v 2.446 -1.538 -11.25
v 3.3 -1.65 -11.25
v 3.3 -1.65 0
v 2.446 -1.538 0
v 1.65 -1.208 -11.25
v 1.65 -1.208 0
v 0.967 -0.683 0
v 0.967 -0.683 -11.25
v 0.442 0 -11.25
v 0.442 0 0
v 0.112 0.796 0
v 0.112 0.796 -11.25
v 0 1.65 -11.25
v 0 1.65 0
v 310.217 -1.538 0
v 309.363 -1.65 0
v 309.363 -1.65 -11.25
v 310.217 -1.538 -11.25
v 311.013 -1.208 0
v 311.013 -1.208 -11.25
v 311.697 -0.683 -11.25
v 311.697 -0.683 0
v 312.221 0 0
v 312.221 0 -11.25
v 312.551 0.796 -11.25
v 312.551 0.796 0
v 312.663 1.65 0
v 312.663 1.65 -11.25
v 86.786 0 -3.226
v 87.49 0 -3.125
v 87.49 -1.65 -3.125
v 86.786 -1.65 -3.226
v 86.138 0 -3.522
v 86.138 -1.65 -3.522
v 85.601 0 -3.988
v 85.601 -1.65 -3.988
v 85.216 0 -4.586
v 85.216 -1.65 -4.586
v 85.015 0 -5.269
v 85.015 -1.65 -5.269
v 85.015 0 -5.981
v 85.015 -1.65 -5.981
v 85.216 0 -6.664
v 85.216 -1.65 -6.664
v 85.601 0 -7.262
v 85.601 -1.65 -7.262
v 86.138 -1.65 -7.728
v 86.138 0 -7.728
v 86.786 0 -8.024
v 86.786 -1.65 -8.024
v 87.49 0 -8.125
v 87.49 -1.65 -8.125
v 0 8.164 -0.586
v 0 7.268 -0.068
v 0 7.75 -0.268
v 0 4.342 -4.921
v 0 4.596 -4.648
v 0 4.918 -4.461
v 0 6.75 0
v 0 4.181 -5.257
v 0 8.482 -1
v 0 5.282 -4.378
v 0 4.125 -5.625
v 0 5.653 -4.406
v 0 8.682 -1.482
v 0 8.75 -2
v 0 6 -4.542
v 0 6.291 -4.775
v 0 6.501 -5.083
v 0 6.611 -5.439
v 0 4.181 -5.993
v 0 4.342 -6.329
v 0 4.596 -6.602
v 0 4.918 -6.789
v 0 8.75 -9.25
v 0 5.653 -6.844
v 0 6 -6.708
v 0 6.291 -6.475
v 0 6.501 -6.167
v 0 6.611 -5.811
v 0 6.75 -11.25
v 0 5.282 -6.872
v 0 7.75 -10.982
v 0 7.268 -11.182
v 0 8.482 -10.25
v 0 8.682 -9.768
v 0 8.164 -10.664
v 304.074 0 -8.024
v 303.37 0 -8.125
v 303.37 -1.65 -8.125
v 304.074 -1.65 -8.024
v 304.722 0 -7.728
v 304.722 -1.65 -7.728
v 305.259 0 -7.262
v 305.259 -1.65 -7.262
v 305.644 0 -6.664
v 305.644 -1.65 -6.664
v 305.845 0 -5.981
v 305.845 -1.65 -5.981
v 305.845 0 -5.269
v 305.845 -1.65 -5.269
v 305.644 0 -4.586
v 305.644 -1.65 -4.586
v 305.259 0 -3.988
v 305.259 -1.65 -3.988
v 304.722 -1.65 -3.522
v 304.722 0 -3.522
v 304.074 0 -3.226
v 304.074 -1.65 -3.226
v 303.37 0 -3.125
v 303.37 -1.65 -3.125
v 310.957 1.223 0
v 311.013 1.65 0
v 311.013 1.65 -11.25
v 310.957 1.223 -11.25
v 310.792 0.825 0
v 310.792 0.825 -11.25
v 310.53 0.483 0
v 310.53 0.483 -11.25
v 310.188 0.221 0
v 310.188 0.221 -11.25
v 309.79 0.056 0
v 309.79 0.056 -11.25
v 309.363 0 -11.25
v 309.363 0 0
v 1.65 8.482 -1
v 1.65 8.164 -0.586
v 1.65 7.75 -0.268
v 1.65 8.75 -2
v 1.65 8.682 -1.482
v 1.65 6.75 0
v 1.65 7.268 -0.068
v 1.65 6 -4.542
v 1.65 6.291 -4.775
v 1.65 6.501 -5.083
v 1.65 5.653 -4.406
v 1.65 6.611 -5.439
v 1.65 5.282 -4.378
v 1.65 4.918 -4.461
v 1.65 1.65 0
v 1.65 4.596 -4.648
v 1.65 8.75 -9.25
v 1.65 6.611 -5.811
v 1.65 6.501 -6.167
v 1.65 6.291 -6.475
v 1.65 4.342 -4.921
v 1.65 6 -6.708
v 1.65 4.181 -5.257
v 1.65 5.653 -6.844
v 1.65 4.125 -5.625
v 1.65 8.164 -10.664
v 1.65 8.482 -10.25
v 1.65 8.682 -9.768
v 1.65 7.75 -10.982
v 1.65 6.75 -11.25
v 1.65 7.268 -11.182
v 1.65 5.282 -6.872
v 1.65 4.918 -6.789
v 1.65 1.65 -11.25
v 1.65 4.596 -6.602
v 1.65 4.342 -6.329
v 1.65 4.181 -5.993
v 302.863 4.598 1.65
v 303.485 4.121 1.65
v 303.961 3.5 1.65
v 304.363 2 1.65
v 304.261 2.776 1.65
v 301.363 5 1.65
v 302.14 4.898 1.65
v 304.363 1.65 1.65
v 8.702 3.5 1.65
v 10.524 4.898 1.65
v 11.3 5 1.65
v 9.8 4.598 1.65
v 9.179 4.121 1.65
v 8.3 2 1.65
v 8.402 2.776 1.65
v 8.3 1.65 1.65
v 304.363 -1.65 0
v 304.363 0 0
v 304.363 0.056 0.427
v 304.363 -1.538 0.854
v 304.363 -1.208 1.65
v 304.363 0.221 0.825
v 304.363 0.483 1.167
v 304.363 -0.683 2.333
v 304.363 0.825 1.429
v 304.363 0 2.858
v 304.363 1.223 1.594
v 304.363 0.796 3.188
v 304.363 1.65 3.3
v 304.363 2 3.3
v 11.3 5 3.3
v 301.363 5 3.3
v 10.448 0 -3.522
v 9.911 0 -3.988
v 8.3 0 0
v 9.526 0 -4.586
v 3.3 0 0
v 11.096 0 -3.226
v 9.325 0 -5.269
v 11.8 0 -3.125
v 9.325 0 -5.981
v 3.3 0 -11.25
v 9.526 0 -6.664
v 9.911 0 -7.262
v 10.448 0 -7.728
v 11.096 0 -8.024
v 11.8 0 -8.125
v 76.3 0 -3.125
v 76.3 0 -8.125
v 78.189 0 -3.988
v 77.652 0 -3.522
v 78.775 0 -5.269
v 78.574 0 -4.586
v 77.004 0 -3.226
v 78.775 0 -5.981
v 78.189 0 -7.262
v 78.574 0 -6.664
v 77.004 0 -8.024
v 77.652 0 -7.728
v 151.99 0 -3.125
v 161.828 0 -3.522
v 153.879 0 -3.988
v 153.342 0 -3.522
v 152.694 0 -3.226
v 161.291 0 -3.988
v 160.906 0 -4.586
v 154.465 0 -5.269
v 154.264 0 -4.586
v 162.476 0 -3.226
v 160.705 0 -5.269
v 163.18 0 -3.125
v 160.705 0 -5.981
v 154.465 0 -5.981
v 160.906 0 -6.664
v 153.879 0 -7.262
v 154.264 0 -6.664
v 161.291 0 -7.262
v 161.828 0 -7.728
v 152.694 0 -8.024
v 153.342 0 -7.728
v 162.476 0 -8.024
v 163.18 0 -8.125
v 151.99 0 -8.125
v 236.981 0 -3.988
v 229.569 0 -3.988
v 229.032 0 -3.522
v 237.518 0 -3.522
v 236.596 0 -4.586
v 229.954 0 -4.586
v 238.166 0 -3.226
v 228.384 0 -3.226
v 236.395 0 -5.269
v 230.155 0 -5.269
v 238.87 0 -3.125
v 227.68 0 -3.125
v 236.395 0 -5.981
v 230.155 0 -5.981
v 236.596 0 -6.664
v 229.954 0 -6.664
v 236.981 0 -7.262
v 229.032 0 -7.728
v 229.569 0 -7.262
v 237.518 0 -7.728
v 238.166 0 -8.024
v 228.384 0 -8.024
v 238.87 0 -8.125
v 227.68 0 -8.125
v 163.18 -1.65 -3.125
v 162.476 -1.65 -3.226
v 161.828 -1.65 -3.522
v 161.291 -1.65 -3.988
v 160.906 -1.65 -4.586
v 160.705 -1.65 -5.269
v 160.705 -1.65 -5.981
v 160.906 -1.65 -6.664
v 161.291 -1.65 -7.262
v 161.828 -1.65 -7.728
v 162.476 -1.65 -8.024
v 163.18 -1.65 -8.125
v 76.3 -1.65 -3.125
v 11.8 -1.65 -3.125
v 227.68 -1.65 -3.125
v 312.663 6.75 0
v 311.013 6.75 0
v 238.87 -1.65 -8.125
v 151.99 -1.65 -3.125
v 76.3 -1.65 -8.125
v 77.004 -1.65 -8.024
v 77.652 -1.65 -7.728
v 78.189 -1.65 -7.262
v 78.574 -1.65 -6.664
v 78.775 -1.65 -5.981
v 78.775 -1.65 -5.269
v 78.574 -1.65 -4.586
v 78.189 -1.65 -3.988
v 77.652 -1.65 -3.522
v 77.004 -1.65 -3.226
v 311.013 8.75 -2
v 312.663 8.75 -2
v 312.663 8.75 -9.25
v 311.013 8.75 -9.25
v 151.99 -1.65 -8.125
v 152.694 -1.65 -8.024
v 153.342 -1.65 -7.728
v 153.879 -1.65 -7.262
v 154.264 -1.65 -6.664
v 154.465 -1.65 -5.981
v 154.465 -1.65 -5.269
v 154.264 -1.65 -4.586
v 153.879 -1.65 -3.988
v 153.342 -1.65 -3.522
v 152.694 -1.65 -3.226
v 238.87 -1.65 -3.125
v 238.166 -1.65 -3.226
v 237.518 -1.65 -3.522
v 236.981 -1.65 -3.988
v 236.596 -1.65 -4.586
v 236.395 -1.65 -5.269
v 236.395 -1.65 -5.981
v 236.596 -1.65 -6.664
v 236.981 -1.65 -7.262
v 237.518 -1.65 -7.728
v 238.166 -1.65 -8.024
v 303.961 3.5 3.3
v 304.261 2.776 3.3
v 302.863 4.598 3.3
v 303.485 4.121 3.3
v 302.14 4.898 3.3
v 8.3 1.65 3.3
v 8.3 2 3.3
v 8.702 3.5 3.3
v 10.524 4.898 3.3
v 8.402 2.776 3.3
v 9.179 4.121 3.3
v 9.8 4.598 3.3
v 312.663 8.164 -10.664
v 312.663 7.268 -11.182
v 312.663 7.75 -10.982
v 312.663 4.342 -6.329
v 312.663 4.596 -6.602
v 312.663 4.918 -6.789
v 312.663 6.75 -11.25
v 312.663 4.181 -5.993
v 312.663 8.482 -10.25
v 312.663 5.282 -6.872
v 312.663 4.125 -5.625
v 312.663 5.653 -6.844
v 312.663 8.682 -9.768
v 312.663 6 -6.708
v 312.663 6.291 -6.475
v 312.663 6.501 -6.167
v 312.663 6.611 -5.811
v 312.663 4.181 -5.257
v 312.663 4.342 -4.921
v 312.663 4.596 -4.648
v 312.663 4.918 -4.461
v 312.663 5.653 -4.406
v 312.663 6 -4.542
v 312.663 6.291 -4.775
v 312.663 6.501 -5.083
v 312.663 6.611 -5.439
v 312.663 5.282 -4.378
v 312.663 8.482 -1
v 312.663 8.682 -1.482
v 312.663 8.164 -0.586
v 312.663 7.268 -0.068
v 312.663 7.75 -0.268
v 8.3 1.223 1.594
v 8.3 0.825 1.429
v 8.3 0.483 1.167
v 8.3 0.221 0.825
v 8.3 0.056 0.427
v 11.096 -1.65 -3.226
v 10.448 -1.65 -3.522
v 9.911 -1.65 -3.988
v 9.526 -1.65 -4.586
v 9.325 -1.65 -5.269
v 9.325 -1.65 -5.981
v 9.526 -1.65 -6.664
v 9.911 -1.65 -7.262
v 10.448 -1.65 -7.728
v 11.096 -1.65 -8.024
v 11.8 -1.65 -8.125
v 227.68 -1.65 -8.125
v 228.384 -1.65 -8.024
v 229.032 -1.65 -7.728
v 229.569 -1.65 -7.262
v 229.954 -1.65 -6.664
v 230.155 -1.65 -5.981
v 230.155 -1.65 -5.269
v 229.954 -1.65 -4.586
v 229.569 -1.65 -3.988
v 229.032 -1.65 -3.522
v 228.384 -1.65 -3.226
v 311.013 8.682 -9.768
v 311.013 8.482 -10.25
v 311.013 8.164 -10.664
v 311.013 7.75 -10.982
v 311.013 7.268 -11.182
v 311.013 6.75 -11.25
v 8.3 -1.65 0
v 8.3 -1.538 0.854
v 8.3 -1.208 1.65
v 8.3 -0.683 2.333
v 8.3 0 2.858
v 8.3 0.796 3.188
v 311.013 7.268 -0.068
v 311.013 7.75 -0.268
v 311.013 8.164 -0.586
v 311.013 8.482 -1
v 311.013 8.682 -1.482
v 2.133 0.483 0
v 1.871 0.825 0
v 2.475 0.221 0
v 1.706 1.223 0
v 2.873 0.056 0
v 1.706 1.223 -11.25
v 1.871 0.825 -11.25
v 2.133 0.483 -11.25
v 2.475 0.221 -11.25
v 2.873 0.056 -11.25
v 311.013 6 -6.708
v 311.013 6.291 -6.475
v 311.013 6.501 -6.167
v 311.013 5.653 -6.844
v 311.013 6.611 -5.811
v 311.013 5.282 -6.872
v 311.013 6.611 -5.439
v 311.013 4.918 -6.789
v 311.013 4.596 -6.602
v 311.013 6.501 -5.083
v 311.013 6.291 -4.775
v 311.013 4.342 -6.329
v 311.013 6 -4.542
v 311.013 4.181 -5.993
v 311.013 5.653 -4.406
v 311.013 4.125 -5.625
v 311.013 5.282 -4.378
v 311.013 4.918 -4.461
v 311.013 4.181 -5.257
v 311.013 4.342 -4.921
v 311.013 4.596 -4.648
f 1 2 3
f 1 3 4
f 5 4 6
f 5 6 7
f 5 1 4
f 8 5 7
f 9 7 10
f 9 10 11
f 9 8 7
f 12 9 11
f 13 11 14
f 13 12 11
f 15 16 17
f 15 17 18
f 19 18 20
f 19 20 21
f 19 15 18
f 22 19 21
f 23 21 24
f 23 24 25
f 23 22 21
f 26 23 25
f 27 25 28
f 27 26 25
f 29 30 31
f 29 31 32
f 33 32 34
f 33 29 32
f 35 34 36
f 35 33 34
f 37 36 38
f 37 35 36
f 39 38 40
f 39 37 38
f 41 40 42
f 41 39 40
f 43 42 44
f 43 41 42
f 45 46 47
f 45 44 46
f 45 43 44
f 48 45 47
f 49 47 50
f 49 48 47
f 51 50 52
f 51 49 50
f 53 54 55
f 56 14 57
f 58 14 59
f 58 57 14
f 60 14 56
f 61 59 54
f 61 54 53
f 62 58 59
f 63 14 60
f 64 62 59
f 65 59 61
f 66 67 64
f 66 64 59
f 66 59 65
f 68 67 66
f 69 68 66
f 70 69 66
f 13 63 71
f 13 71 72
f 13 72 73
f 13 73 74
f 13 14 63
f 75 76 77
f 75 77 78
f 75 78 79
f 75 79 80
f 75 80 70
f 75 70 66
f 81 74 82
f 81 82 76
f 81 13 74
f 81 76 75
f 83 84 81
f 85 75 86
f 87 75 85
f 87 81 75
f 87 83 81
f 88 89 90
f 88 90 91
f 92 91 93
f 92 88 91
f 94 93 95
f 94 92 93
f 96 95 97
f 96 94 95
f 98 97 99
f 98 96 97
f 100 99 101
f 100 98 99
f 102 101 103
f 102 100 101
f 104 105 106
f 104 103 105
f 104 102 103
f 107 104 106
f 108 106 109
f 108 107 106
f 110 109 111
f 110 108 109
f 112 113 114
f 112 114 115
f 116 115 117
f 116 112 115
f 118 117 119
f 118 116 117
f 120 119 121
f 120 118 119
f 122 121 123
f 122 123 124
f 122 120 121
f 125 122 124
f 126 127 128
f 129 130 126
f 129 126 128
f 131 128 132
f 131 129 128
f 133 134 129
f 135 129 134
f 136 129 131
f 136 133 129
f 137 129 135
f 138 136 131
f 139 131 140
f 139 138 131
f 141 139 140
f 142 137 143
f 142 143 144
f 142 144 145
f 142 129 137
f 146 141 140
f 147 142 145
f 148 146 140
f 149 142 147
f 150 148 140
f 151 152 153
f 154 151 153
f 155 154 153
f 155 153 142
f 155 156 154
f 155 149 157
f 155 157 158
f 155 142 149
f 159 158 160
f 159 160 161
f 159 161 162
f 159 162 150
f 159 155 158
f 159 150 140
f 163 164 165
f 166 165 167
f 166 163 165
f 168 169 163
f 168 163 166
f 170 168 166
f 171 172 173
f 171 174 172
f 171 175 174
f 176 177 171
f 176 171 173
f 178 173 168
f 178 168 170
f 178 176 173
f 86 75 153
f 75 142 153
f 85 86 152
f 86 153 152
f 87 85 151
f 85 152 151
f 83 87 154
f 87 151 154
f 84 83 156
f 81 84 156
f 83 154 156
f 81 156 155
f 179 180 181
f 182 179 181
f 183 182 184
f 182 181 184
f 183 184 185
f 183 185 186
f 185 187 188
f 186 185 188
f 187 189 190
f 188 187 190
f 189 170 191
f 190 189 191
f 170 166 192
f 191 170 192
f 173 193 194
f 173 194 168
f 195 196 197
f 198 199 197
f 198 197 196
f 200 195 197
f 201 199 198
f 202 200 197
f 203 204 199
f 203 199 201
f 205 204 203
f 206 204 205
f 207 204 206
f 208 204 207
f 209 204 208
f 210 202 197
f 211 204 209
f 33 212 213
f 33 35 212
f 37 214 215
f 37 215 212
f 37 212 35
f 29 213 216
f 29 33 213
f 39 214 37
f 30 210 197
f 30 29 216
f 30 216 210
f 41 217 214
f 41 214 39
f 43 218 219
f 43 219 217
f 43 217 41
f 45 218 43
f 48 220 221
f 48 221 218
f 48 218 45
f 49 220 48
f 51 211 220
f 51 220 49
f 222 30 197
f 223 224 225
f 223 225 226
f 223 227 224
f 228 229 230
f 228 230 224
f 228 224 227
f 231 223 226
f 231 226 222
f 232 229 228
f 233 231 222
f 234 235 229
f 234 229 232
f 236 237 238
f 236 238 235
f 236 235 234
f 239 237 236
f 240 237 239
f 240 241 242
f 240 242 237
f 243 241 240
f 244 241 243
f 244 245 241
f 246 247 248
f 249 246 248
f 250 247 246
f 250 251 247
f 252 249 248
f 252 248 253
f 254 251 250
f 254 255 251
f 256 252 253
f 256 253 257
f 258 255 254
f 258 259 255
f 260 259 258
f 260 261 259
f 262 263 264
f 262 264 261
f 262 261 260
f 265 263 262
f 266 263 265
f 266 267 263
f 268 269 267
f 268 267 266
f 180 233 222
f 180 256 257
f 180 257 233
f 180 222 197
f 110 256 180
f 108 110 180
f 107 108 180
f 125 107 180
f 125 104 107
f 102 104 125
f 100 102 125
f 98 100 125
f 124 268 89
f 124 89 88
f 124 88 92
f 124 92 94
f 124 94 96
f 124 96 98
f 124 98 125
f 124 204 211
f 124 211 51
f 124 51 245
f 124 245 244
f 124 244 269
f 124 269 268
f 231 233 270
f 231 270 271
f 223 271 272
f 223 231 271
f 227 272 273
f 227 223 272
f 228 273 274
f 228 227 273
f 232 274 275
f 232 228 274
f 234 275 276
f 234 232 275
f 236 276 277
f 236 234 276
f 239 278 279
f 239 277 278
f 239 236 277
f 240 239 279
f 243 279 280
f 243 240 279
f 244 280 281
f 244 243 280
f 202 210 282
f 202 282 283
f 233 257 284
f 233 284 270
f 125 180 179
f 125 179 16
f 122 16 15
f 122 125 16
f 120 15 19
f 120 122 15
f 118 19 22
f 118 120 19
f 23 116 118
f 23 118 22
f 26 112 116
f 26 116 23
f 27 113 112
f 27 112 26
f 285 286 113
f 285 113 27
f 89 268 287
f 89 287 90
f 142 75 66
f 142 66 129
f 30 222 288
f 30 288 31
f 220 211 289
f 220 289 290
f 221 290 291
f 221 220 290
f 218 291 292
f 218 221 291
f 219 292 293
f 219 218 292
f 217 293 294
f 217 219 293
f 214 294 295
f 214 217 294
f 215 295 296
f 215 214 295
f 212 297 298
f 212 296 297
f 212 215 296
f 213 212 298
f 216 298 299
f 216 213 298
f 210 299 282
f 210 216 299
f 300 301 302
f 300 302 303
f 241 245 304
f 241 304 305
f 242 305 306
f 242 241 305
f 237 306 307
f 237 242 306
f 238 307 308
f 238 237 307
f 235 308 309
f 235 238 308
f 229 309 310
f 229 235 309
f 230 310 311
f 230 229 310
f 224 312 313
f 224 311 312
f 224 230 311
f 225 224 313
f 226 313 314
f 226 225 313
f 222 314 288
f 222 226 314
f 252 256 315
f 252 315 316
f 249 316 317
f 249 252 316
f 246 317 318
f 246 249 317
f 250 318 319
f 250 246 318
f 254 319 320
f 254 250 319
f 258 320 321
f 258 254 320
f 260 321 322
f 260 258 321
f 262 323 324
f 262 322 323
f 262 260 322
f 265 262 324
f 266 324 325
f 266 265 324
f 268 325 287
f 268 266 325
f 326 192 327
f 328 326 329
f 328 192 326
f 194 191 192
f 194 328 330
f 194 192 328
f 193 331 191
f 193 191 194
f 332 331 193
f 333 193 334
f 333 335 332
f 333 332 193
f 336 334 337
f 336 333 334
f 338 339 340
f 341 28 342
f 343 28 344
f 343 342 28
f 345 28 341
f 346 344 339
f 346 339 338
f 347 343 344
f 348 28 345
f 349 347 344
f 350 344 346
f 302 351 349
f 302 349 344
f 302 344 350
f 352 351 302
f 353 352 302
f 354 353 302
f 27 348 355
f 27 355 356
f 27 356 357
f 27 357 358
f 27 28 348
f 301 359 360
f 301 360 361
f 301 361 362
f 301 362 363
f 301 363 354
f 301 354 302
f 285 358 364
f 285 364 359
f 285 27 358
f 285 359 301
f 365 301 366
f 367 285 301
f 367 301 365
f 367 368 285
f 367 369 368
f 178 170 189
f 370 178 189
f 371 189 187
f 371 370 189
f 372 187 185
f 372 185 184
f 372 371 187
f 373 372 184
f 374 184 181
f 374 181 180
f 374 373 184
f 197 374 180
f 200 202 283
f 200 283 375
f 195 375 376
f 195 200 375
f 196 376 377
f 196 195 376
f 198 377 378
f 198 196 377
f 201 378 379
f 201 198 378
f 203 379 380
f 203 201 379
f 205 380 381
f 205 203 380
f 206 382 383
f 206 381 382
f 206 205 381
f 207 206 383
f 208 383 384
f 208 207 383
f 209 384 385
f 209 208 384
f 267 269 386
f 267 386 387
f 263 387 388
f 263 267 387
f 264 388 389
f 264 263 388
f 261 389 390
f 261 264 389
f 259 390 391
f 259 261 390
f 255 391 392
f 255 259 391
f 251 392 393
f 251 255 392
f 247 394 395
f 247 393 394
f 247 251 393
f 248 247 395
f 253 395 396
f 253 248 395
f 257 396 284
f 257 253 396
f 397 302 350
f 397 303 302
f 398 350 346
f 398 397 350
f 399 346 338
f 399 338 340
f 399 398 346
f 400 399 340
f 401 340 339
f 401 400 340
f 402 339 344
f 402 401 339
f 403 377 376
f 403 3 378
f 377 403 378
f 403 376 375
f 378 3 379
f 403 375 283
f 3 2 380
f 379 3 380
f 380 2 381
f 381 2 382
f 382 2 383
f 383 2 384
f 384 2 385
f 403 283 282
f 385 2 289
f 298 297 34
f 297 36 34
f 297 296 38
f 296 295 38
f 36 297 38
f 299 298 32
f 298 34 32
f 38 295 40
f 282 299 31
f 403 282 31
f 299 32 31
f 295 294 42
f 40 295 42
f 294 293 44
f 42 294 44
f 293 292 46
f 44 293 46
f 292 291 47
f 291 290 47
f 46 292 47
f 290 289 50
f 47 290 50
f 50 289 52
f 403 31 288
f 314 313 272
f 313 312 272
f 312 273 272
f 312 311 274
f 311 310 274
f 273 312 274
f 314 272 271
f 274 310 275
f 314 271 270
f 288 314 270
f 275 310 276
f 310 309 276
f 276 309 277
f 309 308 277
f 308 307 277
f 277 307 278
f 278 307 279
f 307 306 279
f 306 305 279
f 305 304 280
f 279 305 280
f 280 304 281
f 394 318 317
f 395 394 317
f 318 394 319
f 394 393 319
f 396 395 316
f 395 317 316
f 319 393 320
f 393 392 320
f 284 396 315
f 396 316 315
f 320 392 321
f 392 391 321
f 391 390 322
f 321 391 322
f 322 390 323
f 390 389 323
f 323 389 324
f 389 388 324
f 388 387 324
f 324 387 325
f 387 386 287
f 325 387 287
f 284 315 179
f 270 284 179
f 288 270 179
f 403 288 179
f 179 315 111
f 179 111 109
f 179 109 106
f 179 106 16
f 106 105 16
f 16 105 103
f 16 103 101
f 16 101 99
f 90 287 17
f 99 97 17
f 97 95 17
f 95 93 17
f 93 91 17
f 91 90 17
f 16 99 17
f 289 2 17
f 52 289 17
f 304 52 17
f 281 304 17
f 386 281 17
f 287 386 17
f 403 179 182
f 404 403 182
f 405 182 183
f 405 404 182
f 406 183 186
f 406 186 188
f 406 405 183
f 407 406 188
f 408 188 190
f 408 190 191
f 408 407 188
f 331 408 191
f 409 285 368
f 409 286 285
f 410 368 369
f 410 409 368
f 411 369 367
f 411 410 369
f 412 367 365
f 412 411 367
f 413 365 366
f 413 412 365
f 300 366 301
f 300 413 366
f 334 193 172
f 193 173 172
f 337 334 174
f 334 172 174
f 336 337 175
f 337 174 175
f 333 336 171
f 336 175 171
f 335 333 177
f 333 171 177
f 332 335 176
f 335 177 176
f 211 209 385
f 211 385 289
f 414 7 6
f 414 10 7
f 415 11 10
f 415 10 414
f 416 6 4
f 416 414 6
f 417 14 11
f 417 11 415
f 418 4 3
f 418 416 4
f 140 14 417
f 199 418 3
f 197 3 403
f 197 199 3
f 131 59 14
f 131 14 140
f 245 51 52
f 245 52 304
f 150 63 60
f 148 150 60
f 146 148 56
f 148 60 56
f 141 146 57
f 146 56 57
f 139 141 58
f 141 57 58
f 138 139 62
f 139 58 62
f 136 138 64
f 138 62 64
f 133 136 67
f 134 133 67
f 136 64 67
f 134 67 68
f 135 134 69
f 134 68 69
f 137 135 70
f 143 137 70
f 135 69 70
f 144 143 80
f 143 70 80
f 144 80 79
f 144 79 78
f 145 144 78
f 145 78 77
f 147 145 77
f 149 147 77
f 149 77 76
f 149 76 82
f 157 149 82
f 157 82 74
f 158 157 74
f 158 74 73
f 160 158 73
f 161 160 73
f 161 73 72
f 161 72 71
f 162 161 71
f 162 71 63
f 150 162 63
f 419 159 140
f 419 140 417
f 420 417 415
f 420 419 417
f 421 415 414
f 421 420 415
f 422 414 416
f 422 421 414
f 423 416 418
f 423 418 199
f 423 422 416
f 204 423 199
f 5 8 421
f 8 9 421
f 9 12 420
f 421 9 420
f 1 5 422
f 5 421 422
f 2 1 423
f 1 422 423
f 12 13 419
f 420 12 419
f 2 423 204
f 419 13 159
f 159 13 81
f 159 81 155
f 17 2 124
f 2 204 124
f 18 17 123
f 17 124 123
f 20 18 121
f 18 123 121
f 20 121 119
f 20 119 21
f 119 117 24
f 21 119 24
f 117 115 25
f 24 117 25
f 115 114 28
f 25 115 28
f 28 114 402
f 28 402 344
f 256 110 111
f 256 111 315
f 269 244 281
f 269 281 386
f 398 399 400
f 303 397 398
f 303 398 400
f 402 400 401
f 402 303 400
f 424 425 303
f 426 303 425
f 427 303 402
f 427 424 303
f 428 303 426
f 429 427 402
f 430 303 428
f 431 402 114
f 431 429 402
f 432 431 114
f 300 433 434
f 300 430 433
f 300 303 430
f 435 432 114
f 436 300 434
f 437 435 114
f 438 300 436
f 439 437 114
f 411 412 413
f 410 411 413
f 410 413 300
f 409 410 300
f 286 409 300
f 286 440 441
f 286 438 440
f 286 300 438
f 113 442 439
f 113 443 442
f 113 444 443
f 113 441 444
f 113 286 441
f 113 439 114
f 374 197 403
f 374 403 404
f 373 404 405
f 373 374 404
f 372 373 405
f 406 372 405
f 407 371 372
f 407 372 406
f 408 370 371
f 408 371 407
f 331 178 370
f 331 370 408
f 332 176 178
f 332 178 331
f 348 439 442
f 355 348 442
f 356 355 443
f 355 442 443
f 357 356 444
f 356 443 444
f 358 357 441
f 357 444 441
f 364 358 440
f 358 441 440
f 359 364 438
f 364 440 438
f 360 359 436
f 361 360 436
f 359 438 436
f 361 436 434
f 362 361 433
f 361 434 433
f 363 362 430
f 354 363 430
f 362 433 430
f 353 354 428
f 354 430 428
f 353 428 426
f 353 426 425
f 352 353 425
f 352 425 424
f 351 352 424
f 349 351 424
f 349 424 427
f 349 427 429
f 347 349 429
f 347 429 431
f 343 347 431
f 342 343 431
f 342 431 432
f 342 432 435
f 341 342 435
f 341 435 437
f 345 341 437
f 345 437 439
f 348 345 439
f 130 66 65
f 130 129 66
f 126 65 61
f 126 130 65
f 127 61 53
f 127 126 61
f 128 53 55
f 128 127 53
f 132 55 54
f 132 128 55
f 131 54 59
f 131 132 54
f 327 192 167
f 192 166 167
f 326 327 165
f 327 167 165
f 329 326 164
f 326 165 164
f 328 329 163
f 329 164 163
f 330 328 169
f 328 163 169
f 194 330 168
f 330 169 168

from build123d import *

# Parameters (mm, degrees)
SKETCH1_W                             = 312.6632
SKETCH1_H                             = 11.25
BASE_FLANGE1_DEPTH                    = 1.65
EDGE_FLANGE1_STRIP_W                  = 9.9
EDGE_FLANGE1_STRIP_H                  = 1.65
EDGE_FLANGE1_STRIP_CUT_DEPTH          = 11.25
EDGE_FLANGE1_STRIP_2_W                = 9.9
EDGE_FLANGE1_STRIP_2_H                = 1.65
EDGE_FLANGE1_STRIP_CUT_2_DEPTH        = 11.25
EDGE_FLANGE1_DEPTH                    = 11.25
EDGE_FLANGE1_BEND_DEPTH               = 11.25
TAP_DRILL_FOR_M3X0_5_TAP1_D           = 2.5
TAP_DRILL_FOR_M3X0_5_TAP1_ON_FACE_2_D = 2.5
FILLET1_R                             = 2
CUT_EXTRUDE1_REACH                    = 314.988
EDGE_FLANGE2_DEPTH                    = 296.0632
FILLET2_R                             = 3


# Sheet-metal steps are written as plain solids
with BuildPart() as part:
    # Sketch1 → Base-Flange1 (new body)
    with BuildSketch(Plane(origin=(0, 0, 0), x_dir=(1, 0, 0), z_dir=(0, 1, 0))):
        with Locations((156.3316, 5.625)):
            Rectangle(SKETCH1_W, SKETCH1_H)
    extrude(amount=-BASE_FLANGE1_DEPTH)

    # Edge-Flange1 strip (across the edge) → Edge-Flange1 strip cut (cut)
    with BuildSketch(Plane.XY.offset(-11.25)):
        with Locations((-1.65, -0.825)):
            Rectangle(EDGE_FLANGE1_STRIP_W, EDGE_FLANGE1_STRIP_H)
    extrude(amount=EDGE_FLANGE1_STRIP_CUT_DEPTH, mode=Mode.SUBTRACT)

    # Edge-Flange1 strip 2 (across the edge) → Edge-Flange1 strip cut 2 (cut)
    with BuildSketch(Plane(origin=(312.6632, 0, 0), x_dir=(-1, 0, 0), z_dir=(0, 0, -1))):
        with Locations((-1.65, -0.825)):
            Rectangle(EDGE_FLANGE1_STRIP_2_W, EDGE_FLANGE1_STRIP_2_H)
    extrude(amount=EDGE_FLANGE1_STRIP_CUT_2_DEPTH, mode=Mode.SUBTRACT)

    # Edge-Flange1 section (across the edge) → Edge-Flange1 (add)
    with BuildSketch(Plane.XY.offset(-11.25)):
        with BuildLine():
            Line((0, 1.65), (0, 8.75))
            Line((0, 8.75), (1.65, 8.75))
            Line((1.65, 8.75), (1.65, 1.65))
            ThreePointArc((1.65, 1.65), (2.133273811, 0.483273811), (3.3, 0))
            Line((3.3, 0), (3.3, -1.65))
            ThreePointArc((3.3, -1.65), (0.966547622, -0.683452378), (0, 1.65))
        make_face()
    extrude(amount=EDGE_FLANGE1_DEPTH)

    # Edge-Flange1 section 2 (across the edge) → Edge-Flange1 bend (add)
    with BuildSketch(Plane(origin=(312.6632, 0, 0), x_dir=(-1, 0, 0), z_dir=(0, 0, -1))):
        with BuildLine():
            Line((0, 1.65), (0, 8.75))
            Line((0, 8.75), (1.65, 8.75))
            Line((1.65, 8.75), (1.65, 1.65))
            ThreePointArc((1.65, 1.65), (2.133273811, 0.483273811), (3.3, 0))
            Line((3.3, 0), (3.3, -1.65))
            ThreePointArc((3.3, -1.65), (0.966547622, -0.683452378), (0, 1.65))
        make_face()
    extrude(amount=EDGE_FLANGE1_BEND_DEPTH)

    # Tap Drill for M3x0.5 Tap1 (through all)
    with Locations(Plane(origin=(312.6632, 5.375, -5.625), x_dir=(0, 1, 0), z_dir=(1, 0, 0))):
        with Locations((0, 0)):
            Hole(TAP_DRILL_FOR_M3X0_5_TAP1_D / 2)

    # Tap Drill for M3x0.5 Tap1 on face 2 (through all)
    with Locations(Plane(origin=(0, 5.375, -5.625), x_dir=(0, 0, -1), z_dir=(-1, 0, 0))):
        with Locations((0, 0)):
            Hole(TAP_DRILL_FOR_M3X0_5_TAP1_ON_FACE_2_D / 2)

    # Fillet1
    fillet1_edges = [part.edges().sort_by_distance(p)[0] for p in [
        (0.825, 8.75, -11.25),
        (0.825, 8.75, 0),
        (311.8382, 8.75, 0),
        (311.8382, 8.75, -11.25),
    ]]
    fillet(fillet1_edges, radius=FILLET1_R)

    # Sketch15 → Cut-Extrude1 (cut, up to next)
    with BuildSketch(Plane(origin=(0, 0, 0), x_dir=(1, 0, 0), z_dir=(0, 1, 0)), mode=Mode.PRIVATE) as cut_extrude1_sk1:
        with BuildLine():
            Line((11.8, 8.125), (76.3, 8.125))
            ThreePointArc((76.3, 8.125), (78.8, 5.625), (76.3, 3.125))
            Line((76.3, 3.125), (11.8, 3.125))
            ThreePointArc((11.8, 3.125), (9.3, 5.625), (11.8, 8.125))
        make_face()
    cut_extrude1_tool1 = extrude(cut_extrude1_sk1.sketch, amount=-CUT_EXTRUDE1_REACH, mode=Mode.PRIVATE) & part.part
    # Sketch15 → Cut-Extrude1 (cut, up to next)
    with BuildSketch(Plane(origin=(0, 0, 0), x_dir=(1, 0, 0), z_dir=(0, 1, 0)), mode=Mode.PRIVATE) as cut_extrude1_sk2:
        with BuildLine():
            Line((87.49, 8.125), (151.99, 8.125))
            ThreePointArc((151.99, 8.125), (154.49, 5.625), (151.99, 3.125))
            Line((151.99, 3.125), (87.49, 3.125))
            ThreePointArc((87.49, 3.125), (84.99, 5.625), (87.49, 8.125))
        make_face()
    cut_extrude1_tool2 = extrude(cut_extrude1_sk2.sketch, amount=-CUT_EXTRUDE1_REACH, mode=Mode.PRIVATE) & part.part
    # Sketch15 → Cut-Extrude1 (cut, up to next)
    with BuildSketch(Plane(origin=(0, 0, 0), x_dir=(1, 0, 0), z_dir=(0, 1, 0)), mode=Mode.PRIVATE) as cut_extrude1_sk3:
        with BuildLine():
            Line((163.18, 8.125), (227.68, 8.125))
            ThreePointArc((227.68, 8.125), (230.18, 5.625), (227.68, 3.125))
            Line((227.68, 3.125), (163.18, 3.125))
            ThreePointArc((163.18, 3.125), (160.68, 5.625), (163.18, 8.125))
        make_face()
    cut_extrude1_tool3 = extrude(cut_extrude1_sk3.sketch, amount=-CUT_EXTRUDE1_REACH, mode=Mode.PRIVATE) & part.part
    # Sketch15 → Cut-Extrude1 (cut, up to next)
    with BuildSketch(Plane(origin=(0, 0, 0), x_dir=(1, 0, 0), z_dir=(0, 1, 0)), mode=Mode.PRIVATE) as cut_extrude1_sk4:
        with BuildLine():
            Line((238.87, 8.125), (303.37, 8.125))
            ThreePointArc((303.37, 8.125), (305.87, 5.625), (303.37, 3.125))
            Line((303.37, 3.125), (238.87, 3.125))
            ThreePointArc((238.87, 3.125), (236.37, 5.625), (238.87, 8.125))
        make_face()
    cut_extrude1_tool4 = extrude(cut_extrude1_sk4.sketch, amount=-CUT_EXTRUDE1_REACH, mode=Mode.PRIVATE) & part.part
    add(cut_extrude1_tool1.solids().sort_by_distance((44.05, 0, -5.625))[0], mode=Mode.SUBTRACT)
    add(cut_extrude1_tool2.solids().sort_by_distance((119.74, 0, -5.625))[0], mode=Mode.SUBTRACT)
    add(cut_extrude1_tool3.solids().sort_by_distance((195.43, 0, -5.625))[0], mode=Mode.SUBTRACT)
    add(cut_extrude1_tool4.solids().sort_by_distance((271.12, 0, -5.625))[0], mode=Mode.SUBTRACT)

    # Edge-Flange2 section (across the edge) → Edge-Flange2 (add)
    with BuildSketch(Plane(origin=(8.3, 0, 1.65), x_dir=(0, 0, -1), z_dir=(1, 0, 0))):
        with BuildLine():
            Line((-1.65, 1.65), (-1.65, 5))
            Line((-1.65, 5), (0, 5))
            Line((0, 5), (0, 1.65))
            ThreePointArc((0, 1.65), (0.483273811, 0.483273811), (1.65, 0))
            Line((1.65, 0), (1.65, -1.65))
            ThreePointArc((1.65, -1.65), (-0.683452378, -0.683452378), (-1.65, 1.65))
        make_face()
    extrude(amount=EDGE_FLANGE2_DEPTH)

    # Fillet2
    fillet2_edges = [part.edges().sort_by_distance(p)[0] for p in [
        (8.3, 5, 2.475),
        (304.3632, 5, 2.475),
    ]]
    fillet(fillet2_edges, radius=FILLET2_R)


solid = part.part
